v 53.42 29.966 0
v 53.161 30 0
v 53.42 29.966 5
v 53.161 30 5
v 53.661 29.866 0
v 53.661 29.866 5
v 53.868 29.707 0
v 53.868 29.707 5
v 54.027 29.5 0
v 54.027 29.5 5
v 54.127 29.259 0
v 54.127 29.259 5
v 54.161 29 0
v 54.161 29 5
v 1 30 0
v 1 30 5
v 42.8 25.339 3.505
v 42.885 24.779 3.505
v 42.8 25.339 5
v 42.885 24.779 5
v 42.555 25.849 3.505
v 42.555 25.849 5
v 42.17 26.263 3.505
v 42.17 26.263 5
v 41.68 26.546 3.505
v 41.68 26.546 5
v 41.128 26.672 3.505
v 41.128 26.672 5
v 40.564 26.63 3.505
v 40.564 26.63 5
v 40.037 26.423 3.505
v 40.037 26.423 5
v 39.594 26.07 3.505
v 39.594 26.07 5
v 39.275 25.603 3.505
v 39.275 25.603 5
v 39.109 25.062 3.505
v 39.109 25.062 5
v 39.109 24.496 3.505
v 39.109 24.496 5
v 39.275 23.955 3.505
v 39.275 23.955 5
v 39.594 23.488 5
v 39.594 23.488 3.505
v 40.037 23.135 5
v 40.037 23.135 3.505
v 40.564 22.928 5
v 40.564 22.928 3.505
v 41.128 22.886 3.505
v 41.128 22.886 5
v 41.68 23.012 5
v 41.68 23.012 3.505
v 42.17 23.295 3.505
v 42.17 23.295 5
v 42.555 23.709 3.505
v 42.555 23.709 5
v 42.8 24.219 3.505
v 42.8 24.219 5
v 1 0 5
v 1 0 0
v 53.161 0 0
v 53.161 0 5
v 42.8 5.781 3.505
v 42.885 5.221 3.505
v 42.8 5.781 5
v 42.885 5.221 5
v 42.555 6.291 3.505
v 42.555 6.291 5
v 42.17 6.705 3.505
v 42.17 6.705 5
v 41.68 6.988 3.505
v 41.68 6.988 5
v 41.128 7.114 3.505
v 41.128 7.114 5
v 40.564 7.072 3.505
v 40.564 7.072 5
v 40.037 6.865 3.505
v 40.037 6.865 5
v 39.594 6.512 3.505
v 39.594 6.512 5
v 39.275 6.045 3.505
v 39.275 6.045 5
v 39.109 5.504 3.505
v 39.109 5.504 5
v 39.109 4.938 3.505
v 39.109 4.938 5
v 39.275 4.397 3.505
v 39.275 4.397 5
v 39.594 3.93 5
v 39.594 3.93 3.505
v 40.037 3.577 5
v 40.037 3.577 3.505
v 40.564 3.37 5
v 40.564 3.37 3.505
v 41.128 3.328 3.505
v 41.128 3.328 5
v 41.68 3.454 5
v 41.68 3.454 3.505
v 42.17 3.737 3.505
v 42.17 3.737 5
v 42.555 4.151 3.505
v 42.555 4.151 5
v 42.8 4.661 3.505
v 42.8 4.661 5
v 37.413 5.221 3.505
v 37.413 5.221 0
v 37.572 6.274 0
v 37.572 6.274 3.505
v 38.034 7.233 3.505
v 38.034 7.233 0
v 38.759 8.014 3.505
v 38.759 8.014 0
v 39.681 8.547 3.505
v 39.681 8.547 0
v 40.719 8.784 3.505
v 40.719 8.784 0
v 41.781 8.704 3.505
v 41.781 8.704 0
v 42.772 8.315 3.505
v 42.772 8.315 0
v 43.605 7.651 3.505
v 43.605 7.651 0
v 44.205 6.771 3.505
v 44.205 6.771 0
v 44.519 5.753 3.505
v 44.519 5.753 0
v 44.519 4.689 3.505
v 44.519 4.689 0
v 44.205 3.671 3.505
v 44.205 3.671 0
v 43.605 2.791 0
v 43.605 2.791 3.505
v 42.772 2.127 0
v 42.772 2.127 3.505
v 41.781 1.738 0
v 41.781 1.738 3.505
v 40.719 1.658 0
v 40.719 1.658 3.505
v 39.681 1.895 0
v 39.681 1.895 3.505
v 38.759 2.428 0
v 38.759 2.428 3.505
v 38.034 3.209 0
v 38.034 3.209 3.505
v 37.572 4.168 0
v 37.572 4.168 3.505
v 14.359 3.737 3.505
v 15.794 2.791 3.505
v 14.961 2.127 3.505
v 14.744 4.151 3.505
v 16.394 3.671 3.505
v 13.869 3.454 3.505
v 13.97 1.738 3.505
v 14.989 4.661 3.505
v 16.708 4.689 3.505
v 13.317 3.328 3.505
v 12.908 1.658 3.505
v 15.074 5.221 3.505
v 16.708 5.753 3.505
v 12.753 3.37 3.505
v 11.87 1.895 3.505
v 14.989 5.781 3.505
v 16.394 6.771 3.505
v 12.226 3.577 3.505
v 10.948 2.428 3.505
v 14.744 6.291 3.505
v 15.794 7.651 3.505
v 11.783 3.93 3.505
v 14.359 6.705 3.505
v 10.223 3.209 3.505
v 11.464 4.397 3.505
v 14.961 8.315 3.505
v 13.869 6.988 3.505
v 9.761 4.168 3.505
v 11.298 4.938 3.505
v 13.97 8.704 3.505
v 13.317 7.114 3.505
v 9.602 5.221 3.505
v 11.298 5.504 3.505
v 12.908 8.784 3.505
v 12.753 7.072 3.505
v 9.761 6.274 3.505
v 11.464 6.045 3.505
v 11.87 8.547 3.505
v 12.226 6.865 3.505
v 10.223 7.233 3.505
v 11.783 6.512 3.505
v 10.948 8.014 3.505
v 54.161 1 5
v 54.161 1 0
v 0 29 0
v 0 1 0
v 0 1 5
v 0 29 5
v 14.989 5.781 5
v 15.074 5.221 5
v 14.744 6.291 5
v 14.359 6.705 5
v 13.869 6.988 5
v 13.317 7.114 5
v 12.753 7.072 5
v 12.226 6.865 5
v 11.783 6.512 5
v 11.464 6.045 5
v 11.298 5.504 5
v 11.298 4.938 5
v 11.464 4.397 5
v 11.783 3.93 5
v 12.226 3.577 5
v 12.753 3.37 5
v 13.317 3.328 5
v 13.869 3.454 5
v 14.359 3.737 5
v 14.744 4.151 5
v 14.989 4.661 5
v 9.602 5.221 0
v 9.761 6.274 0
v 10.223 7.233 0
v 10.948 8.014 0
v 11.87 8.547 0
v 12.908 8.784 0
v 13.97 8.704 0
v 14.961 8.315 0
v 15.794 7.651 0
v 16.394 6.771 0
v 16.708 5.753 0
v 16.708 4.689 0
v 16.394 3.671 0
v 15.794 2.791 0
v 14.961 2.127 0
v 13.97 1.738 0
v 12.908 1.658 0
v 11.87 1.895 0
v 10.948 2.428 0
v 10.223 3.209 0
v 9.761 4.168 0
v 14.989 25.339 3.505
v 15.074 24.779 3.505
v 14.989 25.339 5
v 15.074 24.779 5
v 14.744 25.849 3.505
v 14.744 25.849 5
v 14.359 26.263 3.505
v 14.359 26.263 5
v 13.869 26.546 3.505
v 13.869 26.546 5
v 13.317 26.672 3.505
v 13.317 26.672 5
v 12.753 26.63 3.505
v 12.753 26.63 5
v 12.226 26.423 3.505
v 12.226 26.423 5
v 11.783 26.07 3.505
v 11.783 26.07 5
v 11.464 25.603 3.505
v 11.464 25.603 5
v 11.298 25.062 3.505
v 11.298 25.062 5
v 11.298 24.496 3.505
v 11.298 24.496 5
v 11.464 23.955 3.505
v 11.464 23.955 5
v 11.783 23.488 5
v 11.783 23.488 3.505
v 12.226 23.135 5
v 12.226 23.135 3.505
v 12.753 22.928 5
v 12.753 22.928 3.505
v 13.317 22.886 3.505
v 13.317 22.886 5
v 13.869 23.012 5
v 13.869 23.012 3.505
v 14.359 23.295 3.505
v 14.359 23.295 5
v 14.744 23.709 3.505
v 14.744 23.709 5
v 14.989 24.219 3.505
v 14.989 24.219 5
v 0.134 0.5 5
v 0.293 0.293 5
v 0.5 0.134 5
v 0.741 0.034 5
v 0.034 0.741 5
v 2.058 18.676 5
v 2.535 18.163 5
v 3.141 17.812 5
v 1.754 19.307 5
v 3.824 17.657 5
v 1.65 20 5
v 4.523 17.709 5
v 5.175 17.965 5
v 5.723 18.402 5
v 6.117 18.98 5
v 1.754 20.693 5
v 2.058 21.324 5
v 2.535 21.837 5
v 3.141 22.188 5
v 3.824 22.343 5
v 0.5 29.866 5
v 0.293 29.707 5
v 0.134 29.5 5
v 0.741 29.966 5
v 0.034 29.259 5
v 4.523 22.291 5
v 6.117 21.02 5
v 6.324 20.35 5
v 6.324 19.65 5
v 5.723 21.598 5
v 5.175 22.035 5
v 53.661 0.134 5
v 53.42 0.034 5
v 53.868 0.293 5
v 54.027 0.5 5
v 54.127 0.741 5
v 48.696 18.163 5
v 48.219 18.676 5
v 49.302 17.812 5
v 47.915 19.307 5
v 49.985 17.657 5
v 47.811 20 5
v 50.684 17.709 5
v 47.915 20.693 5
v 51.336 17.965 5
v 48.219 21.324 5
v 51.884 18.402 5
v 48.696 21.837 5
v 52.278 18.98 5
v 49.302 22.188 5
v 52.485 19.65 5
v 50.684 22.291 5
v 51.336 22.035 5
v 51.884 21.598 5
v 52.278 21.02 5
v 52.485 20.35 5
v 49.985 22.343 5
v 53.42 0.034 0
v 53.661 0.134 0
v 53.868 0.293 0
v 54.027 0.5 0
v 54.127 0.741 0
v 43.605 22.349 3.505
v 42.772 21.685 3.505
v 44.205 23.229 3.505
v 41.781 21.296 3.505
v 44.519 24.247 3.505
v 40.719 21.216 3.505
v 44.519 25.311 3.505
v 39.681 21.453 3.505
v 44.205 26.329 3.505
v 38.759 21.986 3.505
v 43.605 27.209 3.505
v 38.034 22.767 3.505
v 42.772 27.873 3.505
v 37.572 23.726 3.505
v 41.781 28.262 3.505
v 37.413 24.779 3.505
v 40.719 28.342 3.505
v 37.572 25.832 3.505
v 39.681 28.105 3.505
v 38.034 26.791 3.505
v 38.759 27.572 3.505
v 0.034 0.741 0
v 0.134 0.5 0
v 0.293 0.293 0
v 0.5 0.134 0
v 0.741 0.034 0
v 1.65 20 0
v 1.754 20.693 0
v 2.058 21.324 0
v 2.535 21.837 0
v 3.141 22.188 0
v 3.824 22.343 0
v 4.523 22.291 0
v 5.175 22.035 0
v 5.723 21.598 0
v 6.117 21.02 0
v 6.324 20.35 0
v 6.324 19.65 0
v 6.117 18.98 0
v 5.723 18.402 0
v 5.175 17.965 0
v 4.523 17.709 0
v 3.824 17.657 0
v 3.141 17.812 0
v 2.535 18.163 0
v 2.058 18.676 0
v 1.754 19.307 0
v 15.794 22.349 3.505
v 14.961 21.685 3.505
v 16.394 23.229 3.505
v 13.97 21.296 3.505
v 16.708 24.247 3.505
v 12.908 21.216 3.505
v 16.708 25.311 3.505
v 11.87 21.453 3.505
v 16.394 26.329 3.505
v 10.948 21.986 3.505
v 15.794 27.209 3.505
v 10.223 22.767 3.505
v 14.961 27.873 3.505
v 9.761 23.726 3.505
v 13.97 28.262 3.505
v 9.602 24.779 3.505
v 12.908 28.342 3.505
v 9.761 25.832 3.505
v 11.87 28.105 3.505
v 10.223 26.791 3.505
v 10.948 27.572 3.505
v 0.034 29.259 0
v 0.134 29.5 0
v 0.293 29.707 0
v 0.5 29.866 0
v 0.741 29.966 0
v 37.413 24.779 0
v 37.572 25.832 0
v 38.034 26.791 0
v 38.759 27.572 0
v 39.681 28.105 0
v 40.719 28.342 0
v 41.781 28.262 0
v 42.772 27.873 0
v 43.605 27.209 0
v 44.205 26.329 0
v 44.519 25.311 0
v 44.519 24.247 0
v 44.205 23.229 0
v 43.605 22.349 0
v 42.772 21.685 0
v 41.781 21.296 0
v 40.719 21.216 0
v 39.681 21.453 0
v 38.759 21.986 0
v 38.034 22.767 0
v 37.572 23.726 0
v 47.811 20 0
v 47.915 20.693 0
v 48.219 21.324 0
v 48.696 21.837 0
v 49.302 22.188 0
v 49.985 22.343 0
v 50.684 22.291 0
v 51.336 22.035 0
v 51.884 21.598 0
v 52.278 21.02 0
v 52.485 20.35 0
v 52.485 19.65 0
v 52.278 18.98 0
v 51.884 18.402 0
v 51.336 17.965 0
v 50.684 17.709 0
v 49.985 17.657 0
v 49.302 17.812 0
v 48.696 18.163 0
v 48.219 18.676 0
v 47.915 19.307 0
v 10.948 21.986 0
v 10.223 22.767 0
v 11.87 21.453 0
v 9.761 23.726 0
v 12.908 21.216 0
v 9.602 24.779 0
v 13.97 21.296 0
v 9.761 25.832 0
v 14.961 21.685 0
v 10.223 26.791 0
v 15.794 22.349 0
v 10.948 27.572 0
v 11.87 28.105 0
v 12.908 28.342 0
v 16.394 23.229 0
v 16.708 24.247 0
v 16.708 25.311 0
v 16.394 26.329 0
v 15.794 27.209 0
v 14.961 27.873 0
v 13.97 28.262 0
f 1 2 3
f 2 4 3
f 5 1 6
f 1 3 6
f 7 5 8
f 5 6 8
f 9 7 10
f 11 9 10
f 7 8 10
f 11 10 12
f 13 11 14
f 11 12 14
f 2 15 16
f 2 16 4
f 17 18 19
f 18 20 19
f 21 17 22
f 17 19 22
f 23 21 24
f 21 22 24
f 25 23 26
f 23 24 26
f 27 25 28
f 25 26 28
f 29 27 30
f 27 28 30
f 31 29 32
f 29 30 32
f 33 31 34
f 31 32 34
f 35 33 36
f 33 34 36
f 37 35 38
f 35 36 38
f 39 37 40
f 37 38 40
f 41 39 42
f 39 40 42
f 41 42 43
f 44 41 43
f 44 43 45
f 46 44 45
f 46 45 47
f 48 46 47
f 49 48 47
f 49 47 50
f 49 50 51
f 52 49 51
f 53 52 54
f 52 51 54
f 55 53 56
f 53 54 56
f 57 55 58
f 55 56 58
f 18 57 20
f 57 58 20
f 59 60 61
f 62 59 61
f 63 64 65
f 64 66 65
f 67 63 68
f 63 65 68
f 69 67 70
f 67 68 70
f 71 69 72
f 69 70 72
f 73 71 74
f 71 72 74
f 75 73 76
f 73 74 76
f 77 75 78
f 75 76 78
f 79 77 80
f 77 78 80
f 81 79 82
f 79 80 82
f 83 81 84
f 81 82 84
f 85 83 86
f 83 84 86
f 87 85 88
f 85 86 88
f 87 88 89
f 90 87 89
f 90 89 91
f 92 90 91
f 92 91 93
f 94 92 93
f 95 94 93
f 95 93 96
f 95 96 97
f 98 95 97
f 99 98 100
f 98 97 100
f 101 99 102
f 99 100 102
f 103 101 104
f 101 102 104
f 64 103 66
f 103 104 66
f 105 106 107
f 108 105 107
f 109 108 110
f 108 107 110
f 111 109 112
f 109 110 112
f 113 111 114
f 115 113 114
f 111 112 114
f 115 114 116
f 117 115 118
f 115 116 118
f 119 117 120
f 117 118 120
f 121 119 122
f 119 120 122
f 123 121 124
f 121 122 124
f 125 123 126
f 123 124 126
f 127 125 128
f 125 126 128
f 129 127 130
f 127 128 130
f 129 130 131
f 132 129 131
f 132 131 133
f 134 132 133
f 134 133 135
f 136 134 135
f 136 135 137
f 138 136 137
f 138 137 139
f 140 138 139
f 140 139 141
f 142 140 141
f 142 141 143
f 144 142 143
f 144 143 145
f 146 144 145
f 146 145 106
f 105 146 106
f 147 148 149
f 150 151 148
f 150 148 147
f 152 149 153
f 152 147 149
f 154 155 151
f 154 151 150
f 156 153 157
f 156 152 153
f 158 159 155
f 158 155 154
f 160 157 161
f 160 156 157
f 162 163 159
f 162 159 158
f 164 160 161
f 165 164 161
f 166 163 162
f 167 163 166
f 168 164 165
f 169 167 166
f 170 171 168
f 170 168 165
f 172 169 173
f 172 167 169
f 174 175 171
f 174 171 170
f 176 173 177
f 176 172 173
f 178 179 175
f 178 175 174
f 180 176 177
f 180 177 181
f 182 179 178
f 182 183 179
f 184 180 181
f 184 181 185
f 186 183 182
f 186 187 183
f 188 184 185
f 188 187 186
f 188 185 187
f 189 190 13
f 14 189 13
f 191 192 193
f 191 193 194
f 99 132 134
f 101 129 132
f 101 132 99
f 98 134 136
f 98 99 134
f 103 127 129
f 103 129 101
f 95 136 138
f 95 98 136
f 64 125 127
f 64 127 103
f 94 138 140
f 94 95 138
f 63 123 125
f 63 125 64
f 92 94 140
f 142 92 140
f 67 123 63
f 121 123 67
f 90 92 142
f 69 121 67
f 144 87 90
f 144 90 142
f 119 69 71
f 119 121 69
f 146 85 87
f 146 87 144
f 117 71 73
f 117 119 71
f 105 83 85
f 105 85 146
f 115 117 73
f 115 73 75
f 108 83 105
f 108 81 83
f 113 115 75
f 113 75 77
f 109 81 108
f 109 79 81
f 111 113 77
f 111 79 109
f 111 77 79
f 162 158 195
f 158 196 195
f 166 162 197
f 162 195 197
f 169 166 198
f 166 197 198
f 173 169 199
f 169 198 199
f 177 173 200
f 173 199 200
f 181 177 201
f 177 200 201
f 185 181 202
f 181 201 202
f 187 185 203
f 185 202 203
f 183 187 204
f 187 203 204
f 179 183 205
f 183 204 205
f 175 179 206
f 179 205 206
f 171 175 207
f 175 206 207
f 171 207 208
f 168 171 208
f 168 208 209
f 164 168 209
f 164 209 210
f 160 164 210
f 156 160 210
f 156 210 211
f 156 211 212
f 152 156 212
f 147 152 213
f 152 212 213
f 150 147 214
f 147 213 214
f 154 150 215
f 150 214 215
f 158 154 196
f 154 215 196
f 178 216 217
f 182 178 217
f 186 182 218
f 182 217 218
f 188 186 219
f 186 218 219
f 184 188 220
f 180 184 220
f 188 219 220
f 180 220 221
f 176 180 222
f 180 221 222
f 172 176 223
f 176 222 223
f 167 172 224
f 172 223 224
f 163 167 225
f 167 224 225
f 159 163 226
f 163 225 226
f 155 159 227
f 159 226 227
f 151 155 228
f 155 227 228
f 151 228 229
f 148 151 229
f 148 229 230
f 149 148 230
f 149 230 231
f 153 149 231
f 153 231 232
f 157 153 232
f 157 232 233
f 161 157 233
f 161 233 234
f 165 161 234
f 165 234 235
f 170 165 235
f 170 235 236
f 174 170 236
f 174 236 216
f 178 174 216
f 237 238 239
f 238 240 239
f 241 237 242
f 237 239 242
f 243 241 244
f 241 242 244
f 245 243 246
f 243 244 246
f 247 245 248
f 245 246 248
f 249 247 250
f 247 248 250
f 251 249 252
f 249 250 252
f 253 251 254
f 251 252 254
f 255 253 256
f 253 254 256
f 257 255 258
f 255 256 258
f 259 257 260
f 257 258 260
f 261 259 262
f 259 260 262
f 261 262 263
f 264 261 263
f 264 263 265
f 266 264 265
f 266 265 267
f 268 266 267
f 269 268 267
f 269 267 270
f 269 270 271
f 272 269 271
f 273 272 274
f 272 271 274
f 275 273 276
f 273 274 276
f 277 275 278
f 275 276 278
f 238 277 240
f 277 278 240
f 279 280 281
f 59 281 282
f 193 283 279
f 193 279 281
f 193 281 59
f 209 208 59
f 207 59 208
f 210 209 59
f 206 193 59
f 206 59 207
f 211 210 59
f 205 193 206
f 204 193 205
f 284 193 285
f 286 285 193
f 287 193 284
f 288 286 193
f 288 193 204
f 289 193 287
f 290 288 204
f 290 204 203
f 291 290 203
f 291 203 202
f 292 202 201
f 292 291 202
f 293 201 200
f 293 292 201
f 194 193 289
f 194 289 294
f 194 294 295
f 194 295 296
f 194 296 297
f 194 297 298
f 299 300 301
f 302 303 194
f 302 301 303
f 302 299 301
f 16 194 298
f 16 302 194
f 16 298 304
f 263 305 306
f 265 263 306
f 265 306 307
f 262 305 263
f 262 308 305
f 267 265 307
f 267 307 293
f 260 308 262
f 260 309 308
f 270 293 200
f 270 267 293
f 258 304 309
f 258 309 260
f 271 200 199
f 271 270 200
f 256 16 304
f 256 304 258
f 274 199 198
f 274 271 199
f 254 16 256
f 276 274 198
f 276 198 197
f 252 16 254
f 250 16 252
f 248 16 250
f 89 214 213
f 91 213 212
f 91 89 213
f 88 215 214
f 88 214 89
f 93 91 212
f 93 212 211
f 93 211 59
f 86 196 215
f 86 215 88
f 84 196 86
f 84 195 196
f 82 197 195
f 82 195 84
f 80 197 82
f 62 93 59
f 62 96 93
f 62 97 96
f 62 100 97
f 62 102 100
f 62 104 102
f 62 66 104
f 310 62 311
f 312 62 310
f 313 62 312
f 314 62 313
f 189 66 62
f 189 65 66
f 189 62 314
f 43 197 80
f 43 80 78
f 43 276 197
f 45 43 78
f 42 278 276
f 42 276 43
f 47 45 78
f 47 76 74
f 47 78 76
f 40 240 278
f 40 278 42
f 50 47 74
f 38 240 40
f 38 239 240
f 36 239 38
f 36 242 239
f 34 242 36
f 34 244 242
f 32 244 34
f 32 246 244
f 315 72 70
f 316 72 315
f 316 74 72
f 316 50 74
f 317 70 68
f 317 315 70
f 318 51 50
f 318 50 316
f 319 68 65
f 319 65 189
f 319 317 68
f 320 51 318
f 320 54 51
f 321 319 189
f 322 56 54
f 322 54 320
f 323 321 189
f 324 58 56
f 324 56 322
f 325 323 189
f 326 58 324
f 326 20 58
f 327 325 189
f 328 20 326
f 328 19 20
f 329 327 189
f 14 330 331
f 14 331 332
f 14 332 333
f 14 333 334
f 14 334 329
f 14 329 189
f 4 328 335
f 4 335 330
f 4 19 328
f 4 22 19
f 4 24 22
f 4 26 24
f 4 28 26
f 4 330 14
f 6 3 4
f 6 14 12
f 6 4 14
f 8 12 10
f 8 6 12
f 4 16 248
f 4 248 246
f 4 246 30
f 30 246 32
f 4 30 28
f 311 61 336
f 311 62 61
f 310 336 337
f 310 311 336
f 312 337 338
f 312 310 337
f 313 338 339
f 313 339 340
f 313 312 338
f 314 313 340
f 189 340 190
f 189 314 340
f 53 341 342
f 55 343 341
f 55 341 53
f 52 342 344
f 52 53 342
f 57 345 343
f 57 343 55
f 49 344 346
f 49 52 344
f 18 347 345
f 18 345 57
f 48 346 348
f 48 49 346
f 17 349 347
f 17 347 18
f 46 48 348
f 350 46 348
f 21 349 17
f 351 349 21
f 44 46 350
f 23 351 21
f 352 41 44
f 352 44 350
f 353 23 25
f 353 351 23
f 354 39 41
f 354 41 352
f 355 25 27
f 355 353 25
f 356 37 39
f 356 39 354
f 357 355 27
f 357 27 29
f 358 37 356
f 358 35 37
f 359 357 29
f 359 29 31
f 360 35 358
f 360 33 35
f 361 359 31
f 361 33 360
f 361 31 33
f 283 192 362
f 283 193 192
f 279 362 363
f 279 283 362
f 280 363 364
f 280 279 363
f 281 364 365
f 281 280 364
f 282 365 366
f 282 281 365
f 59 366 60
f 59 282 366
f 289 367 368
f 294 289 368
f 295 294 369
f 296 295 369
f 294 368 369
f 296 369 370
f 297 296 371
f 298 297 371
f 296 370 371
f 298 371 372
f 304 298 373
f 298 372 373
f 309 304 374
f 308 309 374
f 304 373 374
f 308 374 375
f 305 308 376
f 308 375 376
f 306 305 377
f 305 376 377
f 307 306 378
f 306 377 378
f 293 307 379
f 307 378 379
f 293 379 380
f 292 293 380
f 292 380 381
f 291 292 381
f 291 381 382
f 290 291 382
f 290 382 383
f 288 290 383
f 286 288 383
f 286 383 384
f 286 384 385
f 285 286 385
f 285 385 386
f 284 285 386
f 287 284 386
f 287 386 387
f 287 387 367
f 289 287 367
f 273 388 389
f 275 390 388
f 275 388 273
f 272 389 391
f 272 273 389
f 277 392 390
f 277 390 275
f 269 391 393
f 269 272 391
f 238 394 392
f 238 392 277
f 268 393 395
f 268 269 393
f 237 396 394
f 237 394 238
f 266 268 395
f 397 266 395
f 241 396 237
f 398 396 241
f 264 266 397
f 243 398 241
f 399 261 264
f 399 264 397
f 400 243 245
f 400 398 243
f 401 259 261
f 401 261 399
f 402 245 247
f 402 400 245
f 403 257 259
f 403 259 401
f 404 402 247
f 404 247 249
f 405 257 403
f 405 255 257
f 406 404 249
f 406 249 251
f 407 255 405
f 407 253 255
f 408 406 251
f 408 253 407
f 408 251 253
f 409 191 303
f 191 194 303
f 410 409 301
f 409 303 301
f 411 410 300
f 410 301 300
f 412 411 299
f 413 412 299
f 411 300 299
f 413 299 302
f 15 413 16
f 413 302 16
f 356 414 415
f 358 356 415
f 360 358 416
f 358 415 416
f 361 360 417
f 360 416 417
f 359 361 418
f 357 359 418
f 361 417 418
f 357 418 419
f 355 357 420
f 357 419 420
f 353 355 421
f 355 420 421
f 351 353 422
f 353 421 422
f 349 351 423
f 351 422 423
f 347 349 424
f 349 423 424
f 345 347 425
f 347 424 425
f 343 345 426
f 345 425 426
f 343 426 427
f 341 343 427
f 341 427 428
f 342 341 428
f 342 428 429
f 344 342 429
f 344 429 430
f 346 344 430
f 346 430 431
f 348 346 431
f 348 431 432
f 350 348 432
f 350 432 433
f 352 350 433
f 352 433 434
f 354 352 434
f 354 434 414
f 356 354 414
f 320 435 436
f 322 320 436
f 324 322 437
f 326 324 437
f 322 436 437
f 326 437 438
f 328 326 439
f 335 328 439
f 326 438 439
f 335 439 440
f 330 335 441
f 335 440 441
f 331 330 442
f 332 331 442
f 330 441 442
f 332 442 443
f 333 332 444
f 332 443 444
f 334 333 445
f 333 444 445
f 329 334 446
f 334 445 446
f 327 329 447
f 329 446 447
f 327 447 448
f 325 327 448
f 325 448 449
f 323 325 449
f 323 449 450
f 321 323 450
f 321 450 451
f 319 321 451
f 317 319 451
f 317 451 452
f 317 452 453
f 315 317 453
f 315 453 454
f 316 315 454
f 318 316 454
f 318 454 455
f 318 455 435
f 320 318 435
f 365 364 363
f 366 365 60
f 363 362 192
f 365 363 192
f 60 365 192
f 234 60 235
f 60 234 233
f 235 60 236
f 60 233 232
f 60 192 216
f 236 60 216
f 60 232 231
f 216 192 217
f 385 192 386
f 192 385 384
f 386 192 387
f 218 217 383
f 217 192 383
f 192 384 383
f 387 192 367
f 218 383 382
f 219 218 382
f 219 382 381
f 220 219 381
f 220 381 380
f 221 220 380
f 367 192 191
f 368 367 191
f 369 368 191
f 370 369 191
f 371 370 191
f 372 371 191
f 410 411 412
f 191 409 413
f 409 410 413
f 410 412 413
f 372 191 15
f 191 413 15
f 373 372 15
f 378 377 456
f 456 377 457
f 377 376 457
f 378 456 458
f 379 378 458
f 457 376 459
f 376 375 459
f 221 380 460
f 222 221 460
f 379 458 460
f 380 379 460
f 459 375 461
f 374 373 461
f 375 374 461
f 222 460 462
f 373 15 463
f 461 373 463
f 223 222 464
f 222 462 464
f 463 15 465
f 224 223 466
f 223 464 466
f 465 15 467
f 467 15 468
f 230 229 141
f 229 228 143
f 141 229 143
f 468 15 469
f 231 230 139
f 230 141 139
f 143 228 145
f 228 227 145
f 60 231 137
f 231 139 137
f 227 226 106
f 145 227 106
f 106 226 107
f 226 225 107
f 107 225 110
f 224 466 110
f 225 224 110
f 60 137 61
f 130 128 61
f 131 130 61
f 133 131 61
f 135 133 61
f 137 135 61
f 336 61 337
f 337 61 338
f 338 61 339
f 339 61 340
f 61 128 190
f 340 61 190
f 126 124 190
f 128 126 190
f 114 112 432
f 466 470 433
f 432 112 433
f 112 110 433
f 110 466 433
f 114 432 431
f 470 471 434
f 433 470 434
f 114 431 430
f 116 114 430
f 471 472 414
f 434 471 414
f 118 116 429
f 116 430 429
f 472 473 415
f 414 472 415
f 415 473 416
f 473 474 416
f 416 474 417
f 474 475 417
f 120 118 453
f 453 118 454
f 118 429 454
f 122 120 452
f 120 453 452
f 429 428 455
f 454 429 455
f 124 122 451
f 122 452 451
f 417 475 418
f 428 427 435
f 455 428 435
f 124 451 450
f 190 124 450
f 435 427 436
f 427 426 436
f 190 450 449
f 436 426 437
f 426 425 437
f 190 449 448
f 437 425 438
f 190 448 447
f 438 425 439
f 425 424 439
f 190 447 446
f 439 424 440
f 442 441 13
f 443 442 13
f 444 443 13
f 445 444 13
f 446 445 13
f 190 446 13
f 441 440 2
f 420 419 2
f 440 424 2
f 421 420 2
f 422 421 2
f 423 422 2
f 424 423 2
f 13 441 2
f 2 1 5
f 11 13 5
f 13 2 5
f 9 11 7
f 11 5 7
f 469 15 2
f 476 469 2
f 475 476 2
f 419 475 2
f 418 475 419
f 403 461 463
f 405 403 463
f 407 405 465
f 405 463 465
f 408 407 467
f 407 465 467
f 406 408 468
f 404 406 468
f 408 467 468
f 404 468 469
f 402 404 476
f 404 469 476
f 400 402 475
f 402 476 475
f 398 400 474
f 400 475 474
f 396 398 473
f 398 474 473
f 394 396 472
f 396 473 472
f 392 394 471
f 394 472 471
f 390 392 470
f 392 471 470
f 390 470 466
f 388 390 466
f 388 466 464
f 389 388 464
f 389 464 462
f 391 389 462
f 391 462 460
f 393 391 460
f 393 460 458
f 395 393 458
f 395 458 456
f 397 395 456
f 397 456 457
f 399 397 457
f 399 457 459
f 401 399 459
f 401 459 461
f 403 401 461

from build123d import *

# Parameters (mm, degrees)
SKETCH1_W                                      = 54.161
SKETCH1_H                                      = 30
BOSS_EXTRUDE1_DEPTH                            = 5
M4_CLEARANCE_HOLE1_D                           = 4.7
FILLET1_R                                      = 1
CBORE_FOR_6_SOCKET_HEAD_CAP_SCREW1_D           = 3.7973
CBORE_FOR_6_SOCKET_HEAD_CAP_SCREW1_CBORE_D     = 7.14502
CBORE_FOR_6_SOCKET_HEAD_CAP_SCREW1_CBORE_DEPTH = 3.5052


with BuildPart() as part:
    # Sketch1 → Boss-Extrude1 (new body)
    with BuildSketch(Plane.XY):
        with Locations((27.0805, 15)):
            Rectangle(SKETCH1_W, SKETCH1_H)
    extrude(amount=BOSS_EXTRUDE1_DEPTH)

    # M4 Clearance Hole1 (through all)
    with Locations(Plane.XY.offset(5)):
        with Locations((4, 20), (50.161, 20)):
            Hole(M4_CLEARANCE_HOLE1_D / 2)

    # Fillet1
    fillet1_edges = [part.edges().sort_by_distance(p)[0] for p in [
        (0, 30, 2.5),
        (54.161, 30, 2.5),
        (54.161, 0, 2.5),
        (0, 0, 2.5),
    ]]
    fillet(fillet1_edges, radius=FILLET1_R)

    # CBORE for #6 Socket Head Cap Screw1 (through all)
    with Locations(Plane(origin=(0, 0, 0), x_dir=(-1, 0, 0), z_dir=(0, 0, -1))):
        with Locations((-40.986, 24.779), (-13.175, 24.779), (-40.986, 5.221), (-13.175, 5.221)):
            CounterBoreHole(CBORE_FOR_6_SOCKET_HEAD_CAP_SCREW1_D / 2, CBORE_FOR_6_SOCKET_HEAD_CAP_SCREW1_CBORE_D / 2, CBORE_FOR_6_SOCKET_HEAD_CAP_SCREW1_CBORE_DEPTH)


solid = part.part
